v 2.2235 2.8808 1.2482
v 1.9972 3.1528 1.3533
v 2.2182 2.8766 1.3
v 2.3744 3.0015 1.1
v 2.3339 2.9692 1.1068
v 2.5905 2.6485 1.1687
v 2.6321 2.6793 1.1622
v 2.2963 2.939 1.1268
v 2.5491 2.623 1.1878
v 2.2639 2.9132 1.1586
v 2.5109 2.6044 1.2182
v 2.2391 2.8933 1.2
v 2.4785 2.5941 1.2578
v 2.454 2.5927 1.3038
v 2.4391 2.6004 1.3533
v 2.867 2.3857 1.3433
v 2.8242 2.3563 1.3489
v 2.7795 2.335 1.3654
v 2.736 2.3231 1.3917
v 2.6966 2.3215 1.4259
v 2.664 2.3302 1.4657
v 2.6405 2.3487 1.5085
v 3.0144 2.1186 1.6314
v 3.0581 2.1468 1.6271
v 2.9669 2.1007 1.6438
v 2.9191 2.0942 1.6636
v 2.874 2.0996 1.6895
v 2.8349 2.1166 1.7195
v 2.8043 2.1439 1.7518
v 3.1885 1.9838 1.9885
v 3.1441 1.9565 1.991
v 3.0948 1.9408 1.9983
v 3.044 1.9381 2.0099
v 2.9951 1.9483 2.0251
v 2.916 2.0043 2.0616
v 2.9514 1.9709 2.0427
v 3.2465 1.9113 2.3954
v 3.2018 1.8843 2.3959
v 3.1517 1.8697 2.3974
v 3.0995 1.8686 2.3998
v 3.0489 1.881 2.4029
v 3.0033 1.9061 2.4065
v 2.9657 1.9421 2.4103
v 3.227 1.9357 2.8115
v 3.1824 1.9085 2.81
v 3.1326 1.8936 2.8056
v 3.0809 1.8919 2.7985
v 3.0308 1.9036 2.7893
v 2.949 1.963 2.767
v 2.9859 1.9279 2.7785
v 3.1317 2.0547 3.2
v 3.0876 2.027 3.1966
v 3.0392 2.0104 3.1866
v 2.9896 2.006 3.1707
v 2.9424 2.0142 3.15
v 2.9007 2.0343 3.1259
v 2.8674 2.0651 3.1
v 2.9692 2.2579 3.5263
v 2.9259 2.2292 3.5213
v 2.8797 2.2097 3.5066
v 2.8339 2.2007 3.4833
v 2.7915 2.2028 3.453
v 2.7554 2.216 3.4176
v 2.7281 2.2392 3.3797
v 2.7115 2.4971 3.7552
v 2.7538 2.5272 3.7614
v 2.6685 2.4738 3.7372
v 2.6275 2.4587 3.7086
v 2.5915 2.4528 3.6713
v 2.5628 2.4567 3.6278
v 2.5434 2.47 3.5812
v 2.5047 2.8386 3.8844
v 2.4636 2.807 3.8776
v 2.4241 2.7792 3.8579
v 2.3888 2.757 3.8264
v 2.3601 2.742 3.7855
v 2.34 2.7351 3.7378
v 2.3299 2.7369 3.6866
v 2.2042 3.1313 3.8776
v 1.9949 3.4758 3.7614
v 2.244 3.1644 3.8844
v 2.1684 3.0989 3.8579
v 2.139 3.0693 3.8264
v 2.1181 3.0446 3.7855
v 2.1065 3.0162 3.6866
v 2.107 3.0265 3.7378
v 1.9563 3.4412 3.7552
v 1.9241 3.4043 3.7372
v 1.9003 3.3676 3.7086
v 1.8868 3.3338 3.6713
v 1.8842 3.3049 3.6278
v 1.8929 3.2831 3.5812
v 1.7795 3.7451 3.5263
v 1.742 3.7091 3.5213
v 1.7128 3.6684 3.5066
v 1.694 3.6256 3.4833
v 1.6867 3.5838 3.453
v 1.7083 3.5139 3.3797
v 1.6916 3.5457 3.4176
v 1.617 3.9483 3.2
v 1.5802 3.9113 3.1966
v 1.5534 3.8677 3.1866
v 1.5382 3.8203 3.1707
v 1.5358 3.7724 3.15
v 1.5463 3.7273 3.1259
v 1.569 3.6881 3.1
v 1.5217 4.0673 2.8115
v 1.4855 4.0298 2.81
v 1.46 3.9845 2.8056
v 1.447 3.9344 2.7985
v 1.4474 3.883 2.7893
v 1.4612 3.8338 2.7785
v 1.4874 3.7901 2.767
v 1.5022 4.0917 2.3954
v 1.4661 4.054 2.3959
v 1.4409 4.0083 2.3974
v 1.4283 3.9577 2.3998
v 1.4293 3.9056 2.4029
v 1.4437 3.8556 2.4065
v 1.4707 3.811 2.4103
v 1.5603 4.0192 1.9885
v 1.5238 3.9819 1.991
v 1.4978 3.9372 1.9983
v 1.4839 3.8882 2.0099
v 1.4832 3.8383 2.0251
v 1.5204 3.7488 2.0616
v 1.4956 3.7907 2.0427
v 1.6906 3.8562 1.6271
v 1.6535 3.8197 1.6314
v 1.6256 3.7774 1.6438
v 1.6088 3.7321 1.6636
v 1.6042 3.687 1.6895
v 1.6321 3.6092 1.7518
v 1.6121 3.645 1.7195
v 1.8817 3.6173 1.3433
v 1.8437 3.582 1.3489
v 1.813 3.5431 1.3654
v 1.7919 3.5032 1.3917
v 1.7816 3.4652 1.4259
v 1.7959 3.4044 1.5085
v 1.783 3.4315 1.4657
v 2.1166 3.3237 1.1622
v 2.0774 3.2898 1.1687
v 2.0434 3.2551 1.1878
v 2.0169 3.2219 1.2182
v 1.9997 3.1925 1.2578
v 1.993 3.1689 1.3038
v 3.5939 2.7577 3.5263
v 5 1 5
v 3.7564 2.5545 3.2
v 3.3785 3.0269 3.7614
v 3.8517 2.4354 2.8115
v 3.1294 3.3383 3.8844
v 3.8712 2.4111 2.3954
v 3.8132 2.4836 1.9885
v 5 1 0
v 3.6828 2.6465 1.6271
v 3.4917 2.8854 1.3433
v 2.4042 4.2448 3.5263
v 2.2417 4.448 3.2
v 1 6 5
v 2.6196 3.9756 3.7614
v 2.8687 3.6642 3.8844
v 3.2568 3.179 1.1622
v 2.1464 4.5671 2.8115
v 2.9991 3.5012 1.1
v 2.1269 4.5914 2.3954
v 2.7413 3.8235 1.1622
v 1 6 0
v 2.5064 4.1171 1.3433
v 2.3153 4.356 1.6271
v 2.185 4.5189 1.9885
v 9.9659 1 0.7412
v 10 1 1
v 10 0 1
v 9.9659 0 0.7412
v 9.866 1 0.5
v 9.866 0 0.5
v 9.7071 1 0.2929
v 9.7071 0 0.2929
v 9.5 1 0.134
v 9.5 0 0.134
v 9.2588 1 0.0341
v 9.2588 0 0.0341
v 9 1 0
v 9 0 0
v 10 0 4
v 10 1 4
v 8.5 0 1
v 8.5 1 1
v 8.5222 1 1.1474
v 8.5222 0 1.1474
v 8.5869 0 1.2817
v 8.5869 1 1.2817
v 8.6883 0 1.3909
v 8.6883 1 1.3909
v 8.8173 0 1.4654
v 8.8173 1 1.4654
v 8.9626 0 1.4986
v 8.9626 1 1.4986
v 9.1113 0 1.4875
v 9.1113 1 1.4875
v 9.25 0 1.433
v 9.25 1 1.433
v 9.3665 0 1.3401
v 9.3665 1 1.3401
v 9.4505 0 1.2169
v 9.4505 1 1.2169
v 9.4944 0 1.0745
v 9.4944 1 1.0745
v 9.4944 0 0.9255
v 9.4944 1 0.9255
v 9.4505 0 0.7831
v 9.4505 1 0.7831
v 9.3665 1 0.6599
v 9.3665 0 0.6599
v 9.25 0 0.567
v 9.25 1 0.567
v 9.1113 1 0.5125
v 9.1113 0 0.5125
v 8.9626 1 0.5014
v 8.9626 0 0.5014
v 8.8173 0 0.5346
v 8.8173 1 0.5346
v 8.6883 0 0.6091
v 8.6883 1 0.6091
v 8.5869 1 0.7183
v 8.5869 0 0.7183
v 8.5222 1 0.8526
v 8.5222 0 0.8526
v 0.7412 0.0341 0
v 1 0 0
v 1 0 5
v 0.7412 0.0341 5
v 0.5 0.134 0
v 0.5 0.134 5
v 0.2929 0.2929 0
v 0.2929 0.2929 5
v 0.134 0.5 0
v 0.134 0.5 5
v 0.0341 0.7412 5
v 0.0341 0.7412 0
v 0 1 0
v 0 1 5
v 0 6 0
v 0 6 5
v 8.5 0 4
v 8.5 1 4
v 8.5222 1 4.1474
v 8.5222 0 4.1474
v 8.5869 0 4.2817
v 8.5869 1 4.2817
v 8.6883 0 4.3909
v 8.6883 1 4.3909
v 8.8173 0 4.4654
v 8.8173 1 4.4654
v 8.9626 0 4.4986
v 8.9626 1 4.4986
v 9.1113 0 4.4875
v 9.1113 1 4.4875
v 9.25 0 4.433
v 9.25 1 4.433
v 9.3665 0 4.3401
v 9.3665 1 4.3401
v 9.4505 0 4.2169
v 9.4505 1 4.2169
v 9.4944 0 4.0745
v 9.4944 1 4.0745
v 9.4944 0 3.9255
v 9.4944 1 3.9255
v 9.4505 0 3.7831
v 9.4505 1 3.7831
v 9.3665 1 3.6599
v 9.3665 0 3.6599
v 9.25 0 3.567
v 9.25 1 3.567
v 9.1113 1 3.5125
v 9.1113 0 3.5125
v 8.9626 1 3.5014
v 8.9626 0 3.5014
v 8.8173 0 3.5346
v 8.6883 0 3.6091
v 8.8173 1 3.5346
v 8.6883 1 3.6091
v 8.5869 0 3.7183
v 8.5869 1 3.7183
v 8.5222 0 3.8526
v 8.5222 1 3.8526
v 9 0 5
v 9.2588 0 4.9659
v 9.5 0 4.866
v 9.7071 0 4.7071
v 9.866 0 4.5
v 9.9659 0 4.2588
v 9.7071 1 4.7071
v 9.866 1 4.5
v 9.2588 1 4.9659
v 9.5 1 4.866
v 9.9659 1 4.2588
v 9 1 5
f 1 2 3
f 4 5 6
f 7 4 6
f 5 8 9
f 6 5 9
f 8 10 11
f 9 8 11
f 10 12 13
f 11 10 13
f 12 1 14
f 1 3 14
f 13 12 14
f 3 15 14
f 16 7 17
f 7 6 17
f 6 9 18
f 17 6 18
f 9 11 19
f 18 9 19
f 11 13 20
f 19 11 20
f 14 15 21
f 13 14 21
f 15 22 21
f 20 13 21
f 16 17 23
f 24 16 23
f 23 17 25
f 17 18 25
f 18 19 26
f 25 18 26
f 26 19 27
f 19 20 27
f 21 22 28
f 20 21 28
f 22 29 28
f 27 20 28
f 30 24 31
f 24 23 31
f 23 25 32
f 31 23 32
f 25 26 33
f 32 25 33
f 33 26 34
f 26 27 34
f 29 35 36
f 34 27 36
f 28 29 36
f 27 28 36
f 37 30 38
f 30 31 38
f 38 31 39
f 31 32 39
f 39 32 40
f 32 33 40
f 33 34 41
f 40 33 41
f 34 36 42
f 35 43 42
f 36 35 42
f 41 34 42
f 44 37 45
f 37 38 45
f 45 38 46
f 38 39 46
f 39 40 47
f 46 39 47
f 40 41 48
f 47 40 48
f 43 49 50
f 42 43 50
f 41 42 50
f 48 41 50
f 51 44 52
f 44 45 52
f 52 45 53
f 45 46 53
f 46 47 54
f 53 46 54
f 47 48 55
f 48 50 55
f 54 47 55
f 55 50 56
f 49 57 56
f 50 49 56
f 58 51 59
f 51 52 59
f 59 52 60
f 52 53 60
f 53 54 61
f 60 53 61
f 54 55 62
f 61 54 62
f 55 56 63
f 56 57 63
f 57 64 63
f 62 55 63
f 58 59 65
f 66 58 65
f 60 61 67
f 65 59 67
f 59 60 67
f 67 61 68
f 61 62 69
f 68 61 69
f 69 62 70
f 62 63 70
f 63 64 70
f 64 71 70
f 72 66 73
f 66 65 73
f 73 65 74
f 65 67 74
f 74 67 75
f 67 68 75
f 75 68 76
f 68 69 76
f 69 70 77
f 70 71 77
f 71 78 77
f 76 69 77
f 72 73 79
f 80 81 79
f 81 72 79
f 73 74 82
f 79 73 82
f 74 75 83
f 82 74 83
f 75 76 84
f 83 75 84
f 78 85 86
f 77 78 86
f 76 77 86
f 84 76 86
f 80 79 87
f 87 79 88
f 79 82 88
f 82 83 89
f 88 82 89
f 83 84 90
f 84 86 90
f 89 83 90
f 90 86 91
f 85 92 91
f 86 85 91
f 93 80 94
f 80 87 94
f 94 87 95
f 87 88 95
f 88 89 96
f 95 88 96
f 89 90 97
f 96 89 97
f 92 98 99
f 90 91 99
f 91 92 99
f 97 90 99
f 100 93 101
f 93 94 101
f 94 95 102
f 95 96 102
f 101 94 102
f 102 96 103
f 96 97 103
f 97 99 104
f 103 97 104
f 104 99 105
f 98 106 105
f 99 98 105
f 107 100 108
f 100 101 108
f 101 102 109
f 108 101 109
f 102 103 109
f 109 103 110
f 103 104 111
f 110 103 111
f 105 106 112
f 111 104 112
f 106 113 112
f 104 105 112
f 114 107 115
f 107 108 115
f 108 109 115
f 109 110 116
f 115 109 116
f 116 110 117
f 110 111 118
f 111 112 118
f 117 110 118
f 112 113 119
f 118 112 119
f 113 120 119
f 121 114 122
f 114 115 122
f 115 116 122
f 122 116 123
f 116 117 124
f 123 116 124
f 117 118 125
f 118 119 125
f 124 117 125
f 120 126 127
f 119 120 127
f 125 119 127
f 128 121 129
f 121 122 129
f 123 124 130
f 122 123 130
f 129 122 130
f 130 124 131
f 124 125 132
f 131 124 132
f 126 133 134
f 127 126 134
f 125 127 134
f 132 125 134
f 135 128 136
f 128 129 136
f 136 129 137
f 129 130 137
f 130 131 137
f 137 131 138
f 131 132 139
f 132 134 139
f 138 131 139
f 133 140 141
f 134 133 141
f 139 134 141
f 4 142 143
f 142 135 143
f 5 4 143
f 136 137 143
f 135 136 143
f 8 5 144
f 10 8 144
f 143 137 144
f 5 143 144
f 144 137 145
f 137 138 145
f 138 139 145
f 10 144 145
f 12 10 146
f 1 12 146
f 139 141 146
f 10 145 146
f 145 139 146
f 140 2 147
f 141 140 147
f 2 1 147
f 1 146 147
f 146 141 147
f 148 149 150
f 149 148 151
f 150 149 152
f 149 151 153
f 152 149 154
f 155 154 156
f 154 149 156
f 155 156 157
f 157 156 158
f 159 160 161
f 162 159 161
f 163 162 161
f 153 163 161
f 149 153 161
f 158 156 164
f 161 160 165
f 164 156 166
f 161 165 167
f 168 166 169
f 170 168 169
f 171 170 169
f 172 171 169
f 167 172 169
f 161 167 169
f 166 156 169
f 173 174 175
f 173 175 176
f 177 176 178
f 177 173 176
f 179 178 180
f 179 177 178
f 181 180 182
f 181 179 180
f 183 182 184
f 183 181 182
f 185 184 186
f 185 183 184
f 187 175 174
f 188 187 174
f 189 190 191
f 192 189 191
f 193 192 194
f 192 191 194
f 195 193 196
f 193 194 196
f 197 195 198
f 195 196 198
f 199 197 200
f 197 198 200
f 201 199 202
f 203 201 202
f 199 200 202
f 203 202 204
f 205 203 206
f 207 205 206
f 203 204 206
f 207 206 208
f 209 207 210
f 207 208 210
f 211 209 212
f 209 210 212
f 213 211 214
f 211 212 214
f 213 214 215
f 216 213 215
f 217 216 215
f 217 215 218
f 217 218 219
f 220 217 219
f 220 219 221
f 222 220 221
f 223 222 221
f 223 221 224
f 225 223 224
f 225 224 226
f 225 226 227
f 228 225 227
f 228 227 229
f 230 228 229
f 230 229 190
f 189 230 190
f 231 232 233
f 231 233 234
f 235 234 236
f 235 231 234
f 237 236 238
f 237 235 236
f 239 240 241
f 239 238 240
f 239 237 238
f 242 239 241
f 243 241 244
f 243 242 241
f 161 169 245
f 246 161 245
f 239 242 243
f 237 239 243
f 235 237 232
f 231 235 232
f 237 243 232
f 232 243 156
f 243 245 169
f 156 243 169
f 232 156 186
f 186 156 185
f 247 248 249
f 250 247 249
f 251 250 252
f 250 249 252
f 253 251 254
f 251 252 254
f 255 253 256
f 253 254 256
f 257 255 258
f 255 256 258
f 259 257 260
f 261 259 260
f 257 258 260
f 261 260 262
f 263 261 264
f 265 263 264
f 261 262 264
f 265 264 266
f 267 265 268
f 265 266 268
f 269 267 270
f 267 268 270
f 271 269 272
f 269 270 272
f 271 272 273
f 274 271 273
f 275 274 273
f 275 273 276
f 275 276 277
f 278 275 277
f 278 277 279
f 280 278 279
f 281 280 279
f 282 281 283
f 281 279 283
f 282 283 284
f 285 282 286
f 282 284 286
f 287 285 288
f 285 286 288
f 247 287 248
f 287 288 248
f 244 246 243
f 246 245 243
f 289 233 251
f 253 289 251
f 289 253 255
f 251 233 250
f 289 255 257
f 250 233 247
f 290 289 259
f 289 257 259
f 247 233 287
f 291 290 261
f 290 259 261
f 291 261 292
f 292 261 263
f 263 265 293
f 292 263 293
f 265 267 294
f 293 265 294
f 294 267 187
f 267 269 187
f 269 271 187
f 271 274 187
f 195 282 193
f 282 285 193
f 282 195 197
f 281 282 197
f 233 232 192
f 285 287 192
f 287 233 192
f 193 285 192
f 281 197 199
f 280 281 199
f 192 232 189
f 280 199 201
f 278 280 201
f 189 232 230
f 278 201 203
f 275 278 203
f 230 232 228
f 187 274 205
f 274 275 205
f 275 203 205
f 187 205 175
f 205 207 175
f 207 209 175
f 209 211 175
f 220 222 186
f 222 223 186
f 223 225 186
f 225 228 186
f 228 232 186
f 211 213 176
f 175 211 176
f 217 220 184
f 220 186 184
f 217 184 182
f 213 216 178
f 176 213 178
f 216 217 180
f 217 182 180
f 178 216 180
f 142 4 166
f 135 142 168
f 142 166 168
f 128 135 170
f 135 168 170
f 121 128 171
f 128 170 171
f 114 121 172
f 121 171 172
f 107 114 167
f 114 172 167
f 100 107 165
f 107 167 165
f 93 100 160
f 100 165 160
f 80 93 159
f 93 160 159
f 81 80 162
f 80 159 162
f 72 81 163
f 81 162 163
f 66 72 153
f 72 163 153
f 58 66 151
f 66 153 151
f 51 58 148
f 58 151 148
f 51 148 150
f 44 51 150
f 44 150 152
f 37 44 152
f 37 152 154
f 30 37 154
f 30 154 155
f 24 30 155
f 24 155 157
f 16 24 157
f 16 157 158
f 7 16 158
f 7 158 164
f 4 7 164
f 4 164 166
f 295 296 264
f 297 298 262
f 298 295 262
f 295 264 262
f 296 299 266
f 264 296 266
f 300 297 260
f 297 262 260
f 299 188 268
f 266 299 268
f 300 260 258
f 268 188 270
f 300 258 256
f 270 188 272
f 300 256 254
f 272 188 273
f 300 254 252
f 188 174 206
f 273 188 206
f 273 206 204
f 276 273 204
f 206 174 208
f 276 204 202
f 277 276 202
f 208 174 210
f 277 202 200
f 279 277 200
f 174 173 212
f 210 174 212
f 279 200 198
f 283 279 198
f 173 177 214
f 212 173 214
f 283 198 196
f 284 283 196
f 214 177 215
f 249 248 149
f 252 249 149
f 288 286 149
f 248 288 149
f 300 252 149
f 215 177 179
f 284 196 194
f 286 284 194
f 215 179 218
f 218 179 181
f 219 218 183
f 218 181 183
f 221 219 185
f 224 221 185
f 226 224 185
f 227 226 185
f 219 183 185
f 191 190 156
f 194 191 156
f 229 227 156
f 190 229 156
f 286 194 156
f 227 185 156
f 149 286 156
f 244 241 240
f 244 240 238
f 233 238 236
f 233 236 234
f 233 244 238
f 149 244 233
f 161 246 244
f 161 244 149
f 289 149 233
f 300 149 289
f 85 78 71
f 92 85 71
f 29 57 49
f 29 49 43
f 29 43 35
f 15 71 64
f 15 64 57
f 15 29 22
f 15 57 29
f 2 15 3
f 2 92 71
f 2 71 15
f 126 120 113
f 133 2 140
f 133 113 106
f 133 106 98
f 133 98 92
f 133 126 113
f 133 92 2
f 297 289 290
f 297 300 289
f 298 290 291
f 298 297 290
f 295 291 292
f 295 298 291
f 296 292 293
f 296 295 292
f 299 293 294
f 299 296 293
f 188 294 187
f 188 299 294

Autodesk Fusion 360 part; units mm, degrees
sketch "Sketch1" plane through (0, 0, 0) normal (0, 0, 1) x (1, 0, 0)
  line L0 (0, 6) -> (0, 1)
  line L1 (1, 0) -> (10, 0)
  line L2 (10, 0) -> (10, 1)
  line L3 (10, 1) -> (5, 1)
  line L4 (5, 1) -> (1, 6)
  line L5 (1, 6) -> (0, 6)
  arc A0 (0, 1) -> (1, 0) centre (1, 1) ccw
  dimension "d1" = 6
  dimension "d2" = 10
  dimension "d3" = 1
  dimension "d4" = 5
  dimension "d5" = 1
  dimension "d6" = 1
extrude "Extrude1" add sketch "Sketch1" along normal blind 5
sketch "Sketch2" plane through (3.5366, 2.8293, 0) normal (0.7809, 0.6247, 0) x (0, 0, -1)
  line L0 (0, -2.3426) -> (0, 4.0605)
  line L1 (0, 4.0605) -> (-5, 4.0605)
  line L2 (-5, 4.0605) -> (-5, -2.3426)
  line L3 (-5, -2.3426) -> (0, -2.3426)
  circle A0 centre (-2.5, 0.8605) radius 1.4
  dimension "d9" = 2.8
  dimension "d10" = 3.2
  dimension "d11" = 2.5
extrude "Extrude2" cut sketch "Sketch2" against normal blind 1 contours A0
fillet "Fillet1" radius 0.2 1 edges at (1.9019, 3.2718, 3.8053)
fillet "Fillet2" radius 1 1 edges at (10, 0.5, 5)
fillet "Fillet3" radius 1 1 edges at (10, 0.5, 0)
sketch "Sketch3" plane through (0, 1, 0) normal (0, 1, 0) x (-1, 0, 0)
  arc A0 (-10, 1) -> (-9, 0) centre (-9, 1) ccw
  line L0 (-9, 0) -> (-5, 0)
  line L1 (-5, 0) -> (-5, 5)
  line L2 (-5, 5) -> (-9, 5)
  arc A1 (-9, 5) -> (-10, 4) centre (-9, 4) ccw
  line L3 (-10, 4) -> (-10, 1)
  circle A2 centre (-9, 1) radius 0.5
  circle A3 centre (-9, 4) radius 0.5
  dimension "d17" = 1
  dimension "d18" = 1
  dimension "d19" = 4
extrude "Extrude3" cut sketch "Sketch3" against normal through all contours A2 | A3
